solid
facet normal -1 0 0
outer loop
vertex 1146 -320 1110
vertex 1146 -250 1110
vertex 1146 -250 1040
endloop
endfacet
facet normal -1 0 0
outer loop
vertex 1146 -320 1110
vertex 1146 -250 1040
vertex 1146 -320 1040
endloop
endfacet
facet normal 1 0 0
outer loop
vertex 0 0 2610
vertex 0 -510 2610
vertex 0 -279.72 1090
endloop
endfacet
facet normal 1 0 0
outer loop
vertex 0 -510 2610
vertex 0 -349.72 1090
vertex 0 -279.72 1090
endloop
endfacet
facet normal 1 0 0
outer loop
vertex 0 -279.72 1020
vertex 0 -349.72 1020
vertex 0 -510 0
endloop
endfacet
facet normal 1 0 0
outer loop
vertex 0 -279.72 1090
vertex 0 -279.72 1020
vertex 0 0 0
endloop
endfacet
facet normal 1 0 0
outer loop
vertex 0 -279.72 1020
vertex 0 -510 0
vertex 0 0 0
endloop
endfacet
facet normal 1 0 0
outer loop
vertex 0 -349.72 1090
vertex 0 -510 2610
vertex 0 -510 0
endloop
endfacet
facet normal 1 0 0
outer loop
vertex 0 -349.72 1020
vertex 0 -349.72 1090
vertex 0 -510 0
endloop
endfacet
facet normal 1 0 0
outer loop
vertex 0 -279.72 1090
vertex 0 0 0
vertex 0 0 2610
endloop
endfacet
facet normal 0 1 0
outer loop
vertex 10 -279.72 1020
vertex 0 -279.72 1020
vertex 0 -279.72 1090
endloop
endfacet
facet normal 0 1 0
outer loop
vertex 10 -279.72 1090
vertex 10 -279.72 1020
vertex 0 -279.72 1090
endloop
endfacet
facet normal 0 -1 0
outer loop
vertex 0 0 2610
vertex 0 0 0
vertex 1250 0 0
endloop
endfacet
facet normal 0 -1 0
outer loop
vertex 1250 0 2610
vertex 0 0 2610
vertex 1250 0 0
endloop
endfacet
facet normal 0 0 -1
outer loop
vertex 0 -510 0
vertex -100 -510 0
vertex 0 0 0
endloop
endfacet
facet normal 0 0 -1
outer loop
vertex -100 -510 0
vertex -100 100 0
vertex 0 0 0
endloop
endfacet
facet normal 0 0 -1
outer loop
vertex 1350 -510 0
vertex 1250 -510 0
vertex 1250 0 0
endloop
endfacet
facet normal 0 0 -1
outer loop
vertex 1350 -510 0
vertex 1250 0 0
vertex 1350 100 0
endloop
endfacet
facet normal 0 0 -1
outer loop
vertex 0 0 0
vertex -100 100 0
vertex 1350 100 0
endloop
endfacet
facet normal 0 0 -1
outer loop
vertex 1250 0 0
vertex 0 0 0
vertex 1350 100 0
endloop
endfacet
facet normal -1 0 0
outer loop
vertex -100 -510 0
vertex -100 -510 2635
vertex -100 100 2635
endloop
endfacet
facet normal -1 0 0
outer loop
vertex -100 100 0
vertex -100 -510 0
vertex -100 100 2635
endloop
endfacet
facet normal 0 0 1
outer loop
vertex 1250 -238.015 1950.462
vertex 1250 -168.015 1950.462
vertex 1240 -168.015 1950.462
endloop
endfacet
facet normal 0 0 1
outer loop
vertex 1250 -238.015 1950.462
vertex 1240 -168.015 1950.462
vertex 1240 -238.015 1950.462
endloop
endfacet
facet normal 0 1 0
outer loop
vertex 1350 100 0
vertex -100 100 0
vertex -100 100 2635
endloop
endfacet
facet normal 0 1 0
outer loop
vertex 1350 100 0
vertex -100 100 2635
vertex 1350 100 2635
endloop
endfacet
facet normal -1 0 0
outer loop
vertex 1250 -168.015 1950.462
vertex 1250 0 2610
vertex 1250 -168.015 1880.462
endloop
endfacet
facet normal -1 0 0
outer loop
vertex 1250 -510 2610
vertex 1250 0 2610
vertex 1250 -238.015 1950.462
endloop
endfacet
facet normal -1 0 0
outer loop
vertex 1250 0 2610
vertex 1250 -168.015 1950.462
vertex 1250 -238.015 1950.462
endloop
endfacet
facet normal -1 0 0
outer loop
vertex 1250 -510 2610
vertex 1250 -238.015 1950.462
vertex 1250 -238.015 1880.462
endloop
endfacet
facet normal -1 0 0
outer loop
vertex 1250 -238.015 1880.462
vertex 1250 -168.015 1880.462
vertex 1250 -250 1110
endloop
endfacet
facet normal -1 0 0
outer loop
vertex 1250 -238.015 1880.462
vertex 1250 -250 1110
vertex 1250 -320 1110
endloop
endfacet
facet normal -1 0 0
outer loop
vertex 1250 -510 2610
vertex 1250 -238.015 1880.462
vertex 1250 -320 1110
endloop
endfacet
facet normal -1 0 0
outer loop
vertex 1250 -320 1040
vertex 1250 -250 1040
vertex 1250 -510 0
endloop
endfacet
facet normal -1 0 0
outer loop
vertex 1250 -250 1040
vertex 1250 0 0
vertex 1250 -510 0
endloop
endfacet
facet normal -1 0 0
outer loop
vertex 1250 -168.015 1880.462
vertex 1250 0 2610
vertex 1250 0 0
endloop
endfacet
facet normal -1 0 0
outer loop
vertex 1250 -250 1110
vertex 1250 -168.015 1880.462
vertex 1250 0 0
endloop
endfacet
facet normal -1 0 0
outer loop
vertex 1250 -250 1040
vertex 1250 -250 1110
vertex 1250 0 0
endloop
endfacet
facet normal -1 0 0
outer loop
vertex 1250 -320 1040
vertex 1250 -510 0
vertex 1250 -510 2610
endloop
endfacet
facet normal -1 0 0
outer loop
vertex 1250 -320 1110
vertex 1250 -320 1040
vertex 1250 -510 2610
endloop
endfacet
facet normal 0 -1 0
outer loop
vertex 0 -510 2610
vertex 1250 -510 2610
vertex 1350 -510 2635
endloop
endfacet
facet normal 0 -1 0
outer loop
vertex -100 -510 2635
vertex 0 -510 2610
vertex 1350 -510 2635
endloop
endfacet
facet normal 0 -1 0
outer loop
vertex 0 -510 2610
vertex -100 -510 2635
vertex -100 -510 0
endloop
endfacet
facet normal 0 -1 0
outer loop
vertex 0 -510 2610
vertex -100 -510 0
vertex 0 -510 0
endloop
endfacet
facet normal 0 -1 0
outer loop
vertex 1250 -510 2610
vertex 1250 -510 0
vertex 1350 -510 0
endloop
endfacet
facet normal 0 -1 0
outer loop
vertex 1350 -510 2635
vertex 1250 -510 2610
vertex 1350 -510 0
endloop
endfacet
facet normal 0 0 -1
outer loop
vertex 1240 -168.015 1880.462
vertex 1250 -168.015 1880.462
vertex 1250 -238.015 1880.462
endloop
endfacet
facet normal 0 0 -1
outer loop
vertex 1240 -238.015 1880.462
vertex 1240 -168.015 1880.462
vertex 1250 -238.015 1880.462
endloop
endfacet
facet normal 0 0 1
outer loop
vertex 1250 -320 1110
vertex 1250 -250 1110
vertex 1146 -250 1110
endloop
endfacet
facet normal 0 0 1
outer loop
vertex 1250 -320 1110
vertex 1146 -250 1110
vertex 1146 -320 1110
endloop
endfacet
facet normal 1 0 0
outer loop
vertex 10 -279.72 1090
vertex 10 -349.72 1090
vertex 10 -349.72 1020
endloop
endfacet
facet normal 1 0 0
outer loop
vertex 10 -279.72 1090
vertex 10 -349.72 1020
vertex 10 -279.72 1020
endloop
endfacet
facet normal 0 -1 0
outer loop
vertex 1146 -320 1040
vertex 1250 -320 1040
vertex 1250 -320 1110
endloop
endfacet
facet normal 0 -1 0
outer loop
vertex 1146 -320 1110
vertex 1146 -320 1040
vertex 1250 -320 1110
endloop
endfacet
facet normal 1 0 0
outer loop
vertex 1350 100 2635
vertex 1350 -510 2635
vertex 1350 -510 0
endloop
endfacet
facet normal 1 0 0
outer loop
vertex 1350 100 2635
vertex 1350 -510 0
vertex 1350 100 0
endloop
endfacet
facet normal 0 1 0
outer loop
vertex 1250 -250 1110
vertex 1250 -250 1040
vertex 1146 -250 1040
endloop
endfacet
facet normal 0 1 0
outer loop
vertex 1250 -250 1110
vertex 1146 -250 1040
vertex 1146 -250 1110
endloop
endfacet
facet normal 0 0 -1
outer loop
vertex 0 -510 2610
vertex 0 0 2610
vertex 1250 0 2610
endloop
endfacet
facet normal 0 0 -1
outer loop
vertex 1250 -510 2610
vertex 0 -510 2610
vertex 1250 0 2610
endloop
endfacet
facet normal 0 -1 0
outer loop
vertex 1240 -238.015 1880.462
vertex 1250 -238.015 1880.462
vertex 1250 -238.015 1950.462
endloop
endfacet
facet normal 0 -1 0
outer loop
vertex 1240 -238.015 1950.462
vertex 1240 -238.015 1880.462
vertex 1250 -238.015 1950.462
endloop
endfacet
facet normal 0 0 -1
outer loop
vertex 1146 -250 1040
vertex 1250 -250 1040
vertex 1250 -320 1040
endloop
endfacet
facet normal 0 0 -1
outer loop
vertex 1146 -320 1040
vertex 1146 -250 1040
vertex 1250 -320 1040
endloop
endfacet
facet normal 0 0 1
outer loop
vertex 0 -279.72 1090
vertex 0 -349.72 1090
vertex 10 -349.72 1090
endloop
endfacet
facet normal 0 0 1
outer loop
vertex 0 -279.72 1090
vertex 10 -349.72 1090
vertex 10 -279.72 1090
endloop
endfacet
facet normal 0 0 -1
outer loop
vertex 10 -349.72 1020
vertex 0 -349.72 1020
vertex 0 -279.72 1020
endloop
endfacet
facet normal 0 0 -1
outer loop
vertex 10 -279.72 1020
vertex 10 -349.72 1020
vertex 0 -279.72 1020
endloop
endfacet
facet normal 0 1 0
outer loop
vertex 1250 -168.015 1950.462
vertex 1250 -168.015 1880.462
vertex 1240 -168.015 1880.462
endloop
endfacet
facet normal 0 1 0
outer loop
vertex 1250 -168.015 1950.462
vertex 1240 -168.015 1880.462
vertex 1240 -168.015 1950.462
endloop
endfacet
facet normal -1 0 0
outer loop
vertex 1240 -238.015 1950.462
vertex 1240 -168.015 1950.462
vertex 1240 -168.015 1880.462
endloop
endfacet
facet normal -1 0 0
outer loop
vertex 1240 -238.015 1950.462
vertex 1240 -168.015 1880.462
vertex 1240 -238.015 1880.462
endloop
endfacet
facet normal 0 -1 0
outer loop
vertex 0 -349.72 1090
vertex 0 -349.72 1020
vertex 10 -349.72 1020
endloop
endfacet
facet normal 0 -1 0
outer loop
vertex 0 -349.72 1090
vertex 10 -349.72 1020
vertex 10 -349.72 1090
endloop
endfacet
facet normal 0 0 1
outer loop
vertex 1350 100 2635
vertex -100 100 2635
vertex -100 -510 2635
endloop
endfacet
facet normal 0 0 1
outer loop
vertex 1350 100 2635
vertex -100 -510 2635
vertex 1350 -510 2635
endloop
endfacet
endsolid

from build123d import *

# Parameters (mm, degrees)
F1_DEPTH = 2610
F2_W     = 1450
F2_H     = 610
F3_DEPTH = 25
F5_W     = 70
F5_H     = 70
F6_DEPTH = 104
F7_DEPTH = 10
F8_W     = 70
F8_H     = 70
F9_DEPTH = 10


# Not quite as in the source:
# - the program builds the solid bodies; features that only make, move or delete a surface that nothing else refers to are left out


with BuildPart() as f1:
    # F0 (on Top) → F1 (new body)
    with BuildSketch(Plane.XY):
        Polygon((-100, -510), (0, -510), (0, 0), (1250, 0), (1250, -510), (1350, -510), (1350, 100), (-100, 100), align=None)
    extrude(amount=F1_DEPTH)

    # F2 (on face) → F3 (join)
    with BuildSketch(Plane.XY.offset(2610)):
        with Locations((625, -205)):
            Rectangle(F2_W, F2_H)
    extrude(amount=F3_DEPTH)

    # F5 (on face) → F6 (join)
    with BuildSketch(Plane(origin=(1250, 0, 0), x_dir=(0, -1, 0), z_dir=(-1, 0, 0))):
        with Locations((285, 1075)):
            Rectangle(F5_W, F5_H)
    extrude(amount=F6_DEPTH)

    # F5 (on face) → F7 (join)
    with BuildSketch(Plane(origin=(1250, 0, 0), x_dir=(0, -1, 0), z_dir=(-1, 0, 0))):
        with Locations((203.0151075125, 1915.4621696472)):
            Rectangle(F5_W, F5_H)
    extrude(amount=F7_DEPTH)

    # F8 (on face) → F9 (join)
    with BuildSketch(Plane.YZ):
        with Locations((-314.7198361158, 1055)):
            Rectangle(F8_W, F8_H)
    extrude(amount=F9_DEPTH)


solid = f1.part
